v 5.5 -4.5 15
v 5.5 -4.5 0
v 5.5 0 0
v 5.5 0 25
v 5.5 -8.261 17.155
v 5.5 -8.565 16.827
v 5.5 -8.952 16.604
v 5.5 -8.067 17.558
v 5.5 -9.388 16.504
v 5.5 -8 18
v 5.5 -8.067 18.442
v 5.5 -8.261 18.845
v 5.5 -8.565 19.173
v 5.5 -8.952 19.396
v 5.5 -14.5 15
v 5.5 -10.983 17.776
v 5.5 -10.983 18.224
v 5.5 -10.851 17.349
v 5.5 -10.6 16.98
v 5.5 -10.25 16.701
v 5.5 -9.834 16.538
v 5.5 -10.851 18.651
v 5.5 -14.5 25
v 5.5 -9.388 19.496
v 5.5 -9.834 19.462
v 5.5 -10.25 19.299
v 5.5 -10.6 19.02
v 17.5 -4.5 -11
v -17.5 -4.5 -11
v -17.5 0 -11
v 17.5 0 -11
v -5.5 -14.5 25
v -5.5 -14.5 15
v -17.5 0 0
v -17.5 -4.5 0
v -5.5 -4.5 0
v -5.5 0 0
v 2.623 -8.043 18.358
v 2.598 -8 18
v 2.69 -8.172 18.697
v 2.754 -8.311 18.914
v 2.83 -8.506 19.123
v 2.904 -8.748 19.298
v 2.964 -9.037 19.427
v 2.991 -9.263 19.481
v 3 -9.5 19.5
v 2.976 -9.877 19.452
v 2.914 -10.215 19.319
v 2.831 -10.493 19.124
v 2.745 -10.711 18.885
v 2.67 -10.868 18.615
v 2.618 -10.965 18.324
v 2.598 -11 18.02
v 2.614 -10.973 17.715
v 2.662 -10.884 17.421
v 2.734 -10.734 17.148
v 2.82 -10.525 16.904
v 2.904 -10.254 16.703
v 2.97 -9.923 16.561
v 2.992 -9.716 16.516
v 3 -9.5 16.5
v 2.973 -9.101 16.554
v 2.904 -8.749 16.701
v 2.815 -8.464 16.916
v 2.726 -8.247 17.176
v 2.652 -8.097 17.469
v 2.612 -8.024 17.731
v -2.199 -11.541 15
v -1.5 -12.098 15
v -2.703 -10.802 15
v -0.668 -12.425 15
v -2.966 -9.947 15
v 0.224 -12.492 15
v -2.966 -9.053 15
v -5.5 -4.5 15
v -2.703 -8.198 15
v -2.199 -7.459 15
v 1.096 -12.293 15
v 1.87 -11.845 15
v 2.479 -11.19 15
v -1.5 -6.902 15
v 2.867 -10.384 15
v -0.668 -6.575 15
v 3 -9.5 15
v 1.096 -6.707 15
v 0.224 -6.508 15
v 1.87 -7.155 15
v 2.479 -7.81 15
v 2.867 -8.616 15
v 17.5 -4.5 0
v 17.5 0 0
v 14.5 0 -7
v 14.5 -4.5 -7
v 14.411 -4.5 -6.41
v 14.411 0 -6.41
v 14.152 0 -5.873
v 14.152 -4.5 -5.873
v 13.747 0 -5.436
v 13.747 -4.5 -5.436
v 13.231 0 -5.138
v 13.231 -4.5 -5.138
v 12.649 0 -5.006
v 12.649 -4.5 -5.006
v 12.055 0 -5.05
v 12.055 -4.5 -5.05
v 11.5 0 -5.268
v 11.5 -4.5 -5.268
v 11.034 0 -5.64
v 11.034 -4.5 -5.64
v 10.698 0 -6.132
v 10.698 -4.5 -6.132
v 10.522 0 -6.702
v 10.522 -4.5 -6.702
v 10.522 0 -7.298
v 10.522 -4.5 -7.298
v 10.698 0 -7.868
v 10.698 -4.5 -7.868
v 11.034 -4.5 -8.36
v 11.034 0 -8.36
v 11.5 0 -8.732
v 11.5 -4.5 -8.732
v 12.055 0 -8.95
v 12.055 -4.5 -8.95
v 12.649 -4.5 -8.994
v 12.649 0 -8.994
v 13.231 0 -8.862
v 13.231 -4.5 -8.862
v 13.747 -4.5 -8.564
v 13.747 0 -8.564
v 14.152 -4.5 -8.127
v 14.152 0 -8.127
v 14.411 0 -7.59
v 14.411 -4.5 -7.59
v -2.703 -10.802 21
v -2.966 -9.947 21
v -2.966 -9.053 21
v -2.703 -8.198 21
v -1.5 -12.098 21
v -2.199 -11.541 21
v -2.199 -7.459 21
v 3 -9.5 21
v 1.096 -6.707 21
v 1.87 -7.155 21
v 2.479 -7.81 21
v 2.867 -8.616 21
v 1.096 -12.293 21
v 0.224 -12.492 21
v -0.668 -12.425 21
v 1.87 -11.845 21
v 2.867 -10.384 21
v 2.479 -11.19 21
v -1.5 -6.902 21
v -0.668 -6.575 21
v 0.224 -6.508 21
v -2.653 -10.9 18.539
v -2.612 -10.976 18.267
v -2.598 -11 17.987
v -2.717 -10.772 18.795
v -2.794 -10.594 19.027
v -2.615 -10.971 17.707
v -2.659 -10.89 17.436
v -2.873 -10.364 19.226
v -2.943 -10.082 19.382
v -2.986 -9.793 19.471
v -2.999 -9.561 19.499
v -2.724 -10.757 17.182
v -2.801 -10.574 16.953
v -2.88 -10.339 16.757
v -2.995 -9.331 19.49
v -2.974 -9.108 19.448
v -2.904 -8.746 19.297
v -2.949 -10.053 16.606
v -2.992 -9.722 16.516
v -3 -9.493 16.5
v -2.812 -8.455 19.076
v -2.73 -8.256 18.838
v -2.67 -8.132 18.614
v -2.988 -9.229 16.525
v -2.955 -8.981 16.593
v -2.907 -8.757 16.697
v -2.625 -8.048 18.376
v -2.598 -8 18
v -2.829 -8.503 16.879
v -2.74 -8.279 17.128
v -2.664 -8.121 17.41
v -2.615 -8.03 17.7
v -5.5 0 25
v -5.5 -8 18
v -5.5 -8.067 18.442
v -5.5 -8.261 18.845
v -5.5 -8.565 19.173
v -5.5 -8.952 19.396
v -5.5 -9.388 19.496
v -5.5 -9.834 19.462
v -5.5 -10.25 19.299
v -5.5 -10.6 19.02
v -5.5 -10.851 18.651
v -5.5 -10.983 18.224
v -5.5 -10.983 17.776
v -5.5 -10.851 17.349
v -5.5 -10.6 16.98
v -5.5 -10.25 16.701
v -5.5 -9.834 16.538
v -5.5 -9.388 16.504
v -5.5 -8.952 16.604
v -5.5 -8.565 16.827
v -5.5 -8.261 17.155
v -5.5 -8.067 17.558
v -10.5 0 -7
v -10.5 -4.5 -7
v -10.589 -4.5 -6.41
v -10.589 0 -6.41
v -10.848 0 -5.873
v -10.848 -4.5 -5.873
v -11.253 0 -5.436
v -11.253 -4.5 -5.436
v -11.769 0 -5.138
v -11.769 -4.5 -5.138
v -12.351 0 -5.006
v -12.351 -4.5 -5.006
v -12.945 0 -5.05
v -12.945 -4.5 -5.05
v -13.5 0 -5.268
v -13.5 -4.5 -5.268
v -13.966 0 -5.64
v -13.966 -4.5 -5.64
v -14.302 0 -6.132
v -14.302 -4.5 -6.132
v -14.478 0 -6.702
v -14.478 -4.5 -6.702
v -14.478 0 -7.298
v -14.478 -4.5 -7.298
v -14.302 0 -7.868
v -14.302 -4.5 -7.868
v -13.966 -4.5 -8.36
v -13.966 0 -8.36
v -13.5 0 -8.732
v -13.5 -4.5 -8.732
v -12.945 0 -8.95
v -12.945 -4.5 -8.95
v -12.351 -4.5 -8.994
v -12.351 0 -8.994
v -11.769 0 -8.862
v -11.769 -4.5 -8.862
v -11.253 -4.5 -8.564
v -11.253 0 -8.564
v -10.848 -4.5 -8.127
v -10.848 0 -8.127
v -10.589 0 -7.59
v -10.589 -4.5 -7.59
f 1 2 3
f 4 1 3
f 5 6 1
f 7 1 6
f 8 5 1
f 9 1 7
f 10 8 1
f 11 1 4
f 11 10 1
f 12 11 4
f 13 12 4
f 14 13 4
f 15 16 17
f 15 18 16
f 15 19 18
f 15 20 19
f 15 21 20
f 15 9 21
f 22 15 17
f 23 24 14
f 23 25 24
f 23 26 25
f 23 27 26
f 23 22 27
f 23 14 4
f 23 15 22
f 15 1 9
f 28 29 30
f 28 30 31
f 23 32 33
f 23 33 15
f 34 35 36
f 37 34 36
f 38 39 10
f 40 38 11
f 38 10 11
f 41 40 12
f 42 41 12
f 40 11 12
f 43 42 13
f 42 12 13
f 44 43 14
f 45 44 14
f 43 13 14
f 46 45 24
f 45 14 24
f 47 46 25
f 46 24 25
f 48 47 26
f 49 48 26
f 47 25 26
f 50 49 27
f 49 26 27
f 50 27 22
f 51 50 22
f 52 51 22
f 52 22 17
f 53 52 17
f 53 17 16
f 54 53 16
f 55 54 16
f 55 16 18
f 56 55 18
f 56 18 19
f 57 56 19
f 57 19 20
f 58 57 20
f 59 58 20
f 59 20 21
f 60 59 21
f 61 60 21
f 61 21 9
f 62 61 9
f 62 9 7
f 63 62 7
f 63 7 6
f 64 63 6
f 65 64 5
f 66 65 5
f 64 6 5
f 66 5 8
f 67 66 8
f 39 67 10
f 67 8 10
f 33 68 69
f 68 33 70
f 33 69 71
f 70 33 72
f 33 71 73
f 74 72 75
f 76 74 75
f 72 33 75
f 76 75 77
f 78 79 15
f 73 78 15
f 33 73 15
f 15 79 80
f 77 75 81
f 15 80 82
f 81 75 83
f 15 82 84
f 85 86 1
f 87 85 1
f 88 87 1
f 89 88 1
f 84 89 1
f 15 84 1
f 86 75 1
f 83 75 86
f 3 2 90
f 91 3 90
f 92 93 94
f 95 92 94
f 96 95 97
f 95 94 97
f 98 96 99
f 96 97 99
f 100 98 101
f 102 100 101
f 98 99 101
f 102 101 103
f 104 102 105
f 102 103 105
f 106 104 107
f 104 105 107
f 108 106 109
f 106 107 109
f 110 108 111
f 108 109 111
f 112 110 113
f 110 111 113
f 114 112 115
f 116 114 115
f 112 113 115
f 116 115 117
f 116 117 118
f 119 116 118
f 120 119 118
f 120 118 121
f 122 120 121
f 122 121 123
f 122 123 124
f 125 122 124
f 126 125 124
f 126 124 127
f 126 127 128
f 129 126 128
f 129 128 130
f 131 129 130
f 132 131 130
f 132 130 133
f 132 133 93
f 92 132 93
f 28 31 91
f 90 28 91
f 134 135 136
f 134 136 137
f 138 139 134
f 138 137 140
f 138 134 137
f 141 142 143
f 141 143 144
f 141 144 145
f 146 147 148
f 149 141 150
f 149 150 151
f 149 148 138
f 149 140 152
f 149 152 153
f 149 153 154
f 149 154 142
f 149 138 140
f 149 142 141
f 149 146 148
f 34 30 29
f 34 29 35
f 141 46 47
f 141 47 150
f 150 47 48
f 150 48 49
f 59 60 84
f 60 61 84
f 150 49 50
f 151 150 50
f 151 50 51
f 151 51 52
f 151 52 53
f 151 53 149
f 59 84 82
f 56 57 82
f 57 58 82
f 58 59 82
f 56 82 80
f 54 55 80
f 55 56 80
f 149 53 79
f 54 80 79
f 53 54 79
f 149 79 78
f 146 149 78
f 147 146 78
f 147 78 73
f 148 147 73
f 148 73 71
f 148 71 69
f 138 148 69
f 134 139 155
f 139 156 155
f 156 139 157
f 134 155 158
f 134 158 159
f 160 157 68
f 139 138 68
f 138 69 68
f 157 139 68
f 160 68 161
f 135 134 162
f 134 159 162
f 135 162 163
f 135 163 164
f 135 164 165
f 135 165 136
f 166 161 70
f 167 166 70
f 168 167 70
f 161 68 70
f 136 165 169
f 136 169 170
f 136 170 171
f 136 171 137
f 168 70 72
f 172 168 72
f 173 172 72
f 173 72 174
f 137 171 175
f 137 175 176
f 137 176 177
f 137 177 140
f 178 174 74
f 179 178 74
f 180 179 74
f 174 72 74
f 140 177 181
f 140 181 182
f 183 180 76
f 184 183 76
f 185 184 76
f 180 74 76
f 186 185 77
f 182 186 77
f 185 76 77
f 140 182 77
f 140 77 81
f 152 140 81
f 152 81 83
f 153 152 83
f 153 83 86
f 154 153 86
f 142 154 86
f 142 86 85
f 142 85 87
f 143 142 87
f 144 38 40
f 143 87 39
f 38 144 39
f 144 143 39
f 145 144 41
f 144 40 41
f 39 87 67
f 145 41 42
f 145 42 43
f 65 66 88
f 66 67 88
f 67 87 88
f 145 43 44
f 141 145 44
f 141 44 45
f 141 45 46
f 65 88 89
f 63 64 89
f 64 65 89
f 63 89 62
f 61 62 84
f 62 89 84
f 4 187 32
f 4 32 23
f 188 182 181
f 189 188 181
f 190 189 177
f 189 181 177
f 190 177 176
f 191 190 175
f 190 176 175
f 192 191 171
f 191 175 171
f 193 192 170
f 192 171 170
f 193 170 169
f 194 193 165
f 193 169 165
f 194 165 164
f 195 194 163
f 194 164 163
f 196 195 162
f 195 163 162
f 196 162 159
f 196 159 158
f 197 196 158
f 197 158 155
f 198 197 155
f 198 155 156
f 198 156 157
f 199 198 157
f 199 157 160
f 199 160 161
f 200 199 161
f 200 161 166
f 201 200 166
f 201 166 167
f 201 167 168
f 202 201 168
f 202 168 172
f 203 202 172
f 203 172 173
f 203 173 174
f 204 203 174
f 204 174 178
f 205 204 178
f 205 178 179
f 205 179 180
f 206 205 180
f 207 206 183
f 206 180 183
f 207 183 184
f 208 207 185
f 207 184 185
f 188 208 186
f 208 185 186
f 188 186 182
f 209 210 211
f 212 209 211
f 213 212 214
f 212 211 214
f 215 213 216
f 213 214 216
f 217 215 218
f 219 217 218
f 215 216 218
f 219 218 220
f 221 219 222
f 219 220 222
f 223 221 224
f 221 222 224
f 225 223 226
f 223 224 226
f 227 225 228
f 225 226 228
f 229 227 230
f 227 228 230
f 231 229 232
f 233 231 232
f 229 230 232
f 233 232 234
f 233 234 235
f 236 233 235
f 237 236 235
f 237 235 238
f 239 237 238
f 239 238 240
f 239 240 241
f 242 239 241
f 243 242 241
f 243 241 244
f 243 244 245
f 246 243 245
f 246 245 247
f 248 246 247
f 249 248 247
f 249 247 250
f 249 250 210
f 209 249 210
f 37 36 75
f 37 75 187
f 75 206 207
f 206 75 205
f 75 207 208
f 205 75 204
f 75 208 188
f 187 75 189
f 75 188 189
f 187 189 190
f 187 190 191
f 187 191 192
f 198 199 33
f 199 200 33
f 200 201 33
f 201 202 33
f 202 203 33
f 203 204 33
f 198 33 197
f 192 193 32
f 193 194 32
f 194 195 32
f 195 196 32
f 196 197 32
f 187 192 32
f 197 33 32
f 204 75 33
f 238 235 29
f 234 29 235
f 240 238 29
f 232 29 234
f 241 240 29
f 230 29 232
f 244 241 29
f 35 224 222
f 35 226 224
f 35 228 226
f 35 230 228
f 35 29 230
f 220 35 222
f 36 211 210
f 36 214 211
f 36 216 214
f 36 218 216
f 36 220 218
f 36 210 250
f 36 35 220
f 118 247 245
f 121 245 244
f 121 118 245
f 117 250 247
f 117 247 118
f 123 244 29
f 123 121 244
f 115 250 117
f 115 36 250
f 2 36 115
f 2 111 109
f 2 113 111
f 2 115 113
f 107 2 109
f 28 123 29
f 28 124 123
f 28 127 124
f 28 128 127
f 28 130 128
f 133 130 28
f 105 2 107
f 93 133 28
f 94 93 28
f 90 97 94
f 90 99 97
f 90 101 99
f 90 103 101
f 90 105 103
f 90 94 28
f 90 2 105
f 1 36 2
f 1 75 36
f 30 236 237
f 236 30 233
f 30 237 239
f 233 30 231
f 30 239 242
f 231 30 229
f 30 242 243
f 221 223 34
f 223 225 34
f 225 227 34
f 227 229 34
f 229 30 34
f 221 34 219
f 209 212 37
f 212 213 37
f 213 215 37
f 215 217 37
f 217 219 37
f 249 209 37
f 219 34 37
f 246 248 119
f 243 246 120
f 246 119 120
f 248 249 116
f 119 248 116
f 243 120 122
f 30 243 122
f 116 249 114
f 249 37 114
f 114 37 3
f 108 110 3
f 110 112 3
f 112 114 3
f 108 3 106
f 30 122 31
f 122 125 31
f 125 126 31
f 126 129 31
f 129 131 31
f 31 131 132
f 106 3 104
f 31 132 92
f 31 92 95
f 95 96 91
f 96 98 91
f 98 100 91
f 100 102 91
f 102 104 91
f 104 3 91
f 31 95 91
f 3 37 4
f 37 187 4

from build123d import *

# Parameters (mm, degrees)
F0_W      = 35
F0_H      = 45
F1_DEPTH  = 4.5
F2_R      = 2
F3_DEPTH  = 10
F4_W      = 35
F4_H      = 10
F5_DEPTH  = 10
F6_R      = 3
F7_DEPTH  = 6
F8_W      = 35
F8_H      = 4.5
F9_DEPTH  = 2
F10_W     = 12
F10_H     = 25
F11_DEPTH = 14.501
F12_R     = 1.5
F13_DEPTH = 23.001
F14_W     = 35
F14_H     = 6
F15_DEPTH = 4.501
F16_W     = 35
F16_H     = 4.5
F17_DEPTH = 1


with BuildPart() as f1:
    # F0 (on Front) → F1 (new body)
    with BuildSketch(Plane.XZ):
        with Locations((0, 2.5)):
            Rectangle(F0_W, F0_H)
    extrude(amount=F1_DEPTH)

    # F2 (on face) → F3 (cut)
    with BuildSketch(Plane.XZ.offset(4.5)):
        with Locations((12.5, -15)):
            Circle(F2_R)
        with Locations((-12.5, -15)):
            Circle(F2_R)
        with Locations((-12.5, -7)):
            Circle(F2_R)
        with Locations((12.5, -7)):
            Circle(F2_R)
    extrude(amount=-F3_DEPTH, mode=Mode.SUBTRACT)

    # F4 (on face) → F5 (join)
    with BuildSketch(Plane.XZ.offset(4.5)):
        with Locations((0, 20)):
            Rectangle(F4_W, F4_H)
    extrude(amount=F5_DEPTH)

    # F6 (on face) → F7 (cut)
    with BuildSketch(Plane(origin=(0, 0, 15), x_dir=(1, 0, 0), z_dir=(0, 0, -1))):
        with Locations((0, 9.5)):
            Circle(F6_R)
    extrude(amount=-F7_DEPTH, mode=Mode.SUBTRACT)

    # F8 (on face) → F9 (cut)
    with BuildSketch(Plane(origin=(0, 0, -20), x_dir=(1, 0, 0), z_dir=(0, 0, -1))):
        with Locations((0, 2.25)):
            Rectangle(F8_W, F8_H)
    extrude(amount=-F9_DEPTH, mode=Mode.SUBTRACT)

    # F10 (on face) → F11 (cut, through all)
    with BuildSketch(Plane.XZ.offset(14.5)):
        with Locations((-11.5, 12.5)):
            Rectangle(F10_W, F10_H)
        with Locations((11.5, 12.5)):
            Rectangle(F10_W, F10_H)
    extrude(amount=-F11_DEPTH, mode=Mode.SUBTRACT)

    # F12 (on face) → F13 (cut, through all)
    with BuildSketch(Plane.YZ.offset(5.5)):
        with Locations((-9.5, 18)):
            Circle(F12_R)
    extrude(amount=-F13_DEPTH, mode=Mode.SUBTRACT)

    # F14 (on face) → F15 (cut, through all)
    with BuildSketch(Plane.XZ.offset(4.5)):
        with Locations((0, -15)):
            Rectangle(F14_W, F14_H)
    extrude(amount=-F15_DEPTH, mode=Mode.SUBTRACT)

    # F16 (on face) → F17 (cut)
    with BuildSketch(Plane(origin=(0, 0, -12), x_dir=(1, 0, 0), z_dir=(0, 0, -1))):
        with Locations((0, 2.25)):
            Rectangle(F16_W, F16_H)
    extrude(amount=-F17_DEPTH, mode=Mode.SUBTRACT)


solid = f1.part
